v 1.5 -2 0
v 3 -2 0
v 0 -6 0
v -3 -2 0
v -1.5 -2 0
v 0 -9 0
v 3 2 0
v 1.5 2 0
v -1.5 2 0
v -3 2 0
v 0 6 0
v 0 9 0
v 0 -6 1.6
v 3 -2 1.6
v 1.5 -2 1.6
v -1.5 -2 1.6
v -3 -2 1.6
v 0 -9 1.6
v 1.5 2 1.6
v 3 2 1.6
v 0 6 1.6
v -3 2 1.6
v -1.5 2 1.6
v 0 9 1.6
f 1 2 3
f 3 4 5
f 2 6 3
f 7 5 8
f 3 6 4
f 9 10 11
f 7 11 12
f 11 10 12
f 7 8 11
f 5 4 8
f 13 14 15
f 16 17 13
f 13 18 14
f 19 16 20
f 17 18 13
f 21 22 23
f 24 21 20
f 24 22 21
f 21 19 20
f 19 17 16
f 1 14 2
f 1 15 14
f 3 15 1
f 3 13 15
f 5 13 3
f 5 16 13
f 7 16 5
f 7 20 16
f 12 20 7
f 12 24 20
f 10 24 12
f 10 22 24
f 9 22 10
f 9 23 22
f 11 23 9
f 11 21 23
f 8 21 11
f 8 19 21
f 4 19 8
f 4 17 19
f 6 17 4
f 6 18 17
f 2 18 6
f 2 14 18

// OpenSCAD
A=30;
B=50;
W=3;
T=1.6;

X1=1.5;
X2=X1+W/2;

Y1=2;
Y2=6;
Y3=Y2+W;

path=[
[-X2,Y1],
[0,Y3],
[X2,Y1],
[-X1,-Y1],
[-X1,-Y1],
[0,-Y2],
[X1,-Y1],
[X2,-Y1],
[0,-Y3],
[-X2,-Y1],
[X1,Y1],
[0,Y2],
[-X1,Y1],



];

linear_extrude(T)
polygon(path);
